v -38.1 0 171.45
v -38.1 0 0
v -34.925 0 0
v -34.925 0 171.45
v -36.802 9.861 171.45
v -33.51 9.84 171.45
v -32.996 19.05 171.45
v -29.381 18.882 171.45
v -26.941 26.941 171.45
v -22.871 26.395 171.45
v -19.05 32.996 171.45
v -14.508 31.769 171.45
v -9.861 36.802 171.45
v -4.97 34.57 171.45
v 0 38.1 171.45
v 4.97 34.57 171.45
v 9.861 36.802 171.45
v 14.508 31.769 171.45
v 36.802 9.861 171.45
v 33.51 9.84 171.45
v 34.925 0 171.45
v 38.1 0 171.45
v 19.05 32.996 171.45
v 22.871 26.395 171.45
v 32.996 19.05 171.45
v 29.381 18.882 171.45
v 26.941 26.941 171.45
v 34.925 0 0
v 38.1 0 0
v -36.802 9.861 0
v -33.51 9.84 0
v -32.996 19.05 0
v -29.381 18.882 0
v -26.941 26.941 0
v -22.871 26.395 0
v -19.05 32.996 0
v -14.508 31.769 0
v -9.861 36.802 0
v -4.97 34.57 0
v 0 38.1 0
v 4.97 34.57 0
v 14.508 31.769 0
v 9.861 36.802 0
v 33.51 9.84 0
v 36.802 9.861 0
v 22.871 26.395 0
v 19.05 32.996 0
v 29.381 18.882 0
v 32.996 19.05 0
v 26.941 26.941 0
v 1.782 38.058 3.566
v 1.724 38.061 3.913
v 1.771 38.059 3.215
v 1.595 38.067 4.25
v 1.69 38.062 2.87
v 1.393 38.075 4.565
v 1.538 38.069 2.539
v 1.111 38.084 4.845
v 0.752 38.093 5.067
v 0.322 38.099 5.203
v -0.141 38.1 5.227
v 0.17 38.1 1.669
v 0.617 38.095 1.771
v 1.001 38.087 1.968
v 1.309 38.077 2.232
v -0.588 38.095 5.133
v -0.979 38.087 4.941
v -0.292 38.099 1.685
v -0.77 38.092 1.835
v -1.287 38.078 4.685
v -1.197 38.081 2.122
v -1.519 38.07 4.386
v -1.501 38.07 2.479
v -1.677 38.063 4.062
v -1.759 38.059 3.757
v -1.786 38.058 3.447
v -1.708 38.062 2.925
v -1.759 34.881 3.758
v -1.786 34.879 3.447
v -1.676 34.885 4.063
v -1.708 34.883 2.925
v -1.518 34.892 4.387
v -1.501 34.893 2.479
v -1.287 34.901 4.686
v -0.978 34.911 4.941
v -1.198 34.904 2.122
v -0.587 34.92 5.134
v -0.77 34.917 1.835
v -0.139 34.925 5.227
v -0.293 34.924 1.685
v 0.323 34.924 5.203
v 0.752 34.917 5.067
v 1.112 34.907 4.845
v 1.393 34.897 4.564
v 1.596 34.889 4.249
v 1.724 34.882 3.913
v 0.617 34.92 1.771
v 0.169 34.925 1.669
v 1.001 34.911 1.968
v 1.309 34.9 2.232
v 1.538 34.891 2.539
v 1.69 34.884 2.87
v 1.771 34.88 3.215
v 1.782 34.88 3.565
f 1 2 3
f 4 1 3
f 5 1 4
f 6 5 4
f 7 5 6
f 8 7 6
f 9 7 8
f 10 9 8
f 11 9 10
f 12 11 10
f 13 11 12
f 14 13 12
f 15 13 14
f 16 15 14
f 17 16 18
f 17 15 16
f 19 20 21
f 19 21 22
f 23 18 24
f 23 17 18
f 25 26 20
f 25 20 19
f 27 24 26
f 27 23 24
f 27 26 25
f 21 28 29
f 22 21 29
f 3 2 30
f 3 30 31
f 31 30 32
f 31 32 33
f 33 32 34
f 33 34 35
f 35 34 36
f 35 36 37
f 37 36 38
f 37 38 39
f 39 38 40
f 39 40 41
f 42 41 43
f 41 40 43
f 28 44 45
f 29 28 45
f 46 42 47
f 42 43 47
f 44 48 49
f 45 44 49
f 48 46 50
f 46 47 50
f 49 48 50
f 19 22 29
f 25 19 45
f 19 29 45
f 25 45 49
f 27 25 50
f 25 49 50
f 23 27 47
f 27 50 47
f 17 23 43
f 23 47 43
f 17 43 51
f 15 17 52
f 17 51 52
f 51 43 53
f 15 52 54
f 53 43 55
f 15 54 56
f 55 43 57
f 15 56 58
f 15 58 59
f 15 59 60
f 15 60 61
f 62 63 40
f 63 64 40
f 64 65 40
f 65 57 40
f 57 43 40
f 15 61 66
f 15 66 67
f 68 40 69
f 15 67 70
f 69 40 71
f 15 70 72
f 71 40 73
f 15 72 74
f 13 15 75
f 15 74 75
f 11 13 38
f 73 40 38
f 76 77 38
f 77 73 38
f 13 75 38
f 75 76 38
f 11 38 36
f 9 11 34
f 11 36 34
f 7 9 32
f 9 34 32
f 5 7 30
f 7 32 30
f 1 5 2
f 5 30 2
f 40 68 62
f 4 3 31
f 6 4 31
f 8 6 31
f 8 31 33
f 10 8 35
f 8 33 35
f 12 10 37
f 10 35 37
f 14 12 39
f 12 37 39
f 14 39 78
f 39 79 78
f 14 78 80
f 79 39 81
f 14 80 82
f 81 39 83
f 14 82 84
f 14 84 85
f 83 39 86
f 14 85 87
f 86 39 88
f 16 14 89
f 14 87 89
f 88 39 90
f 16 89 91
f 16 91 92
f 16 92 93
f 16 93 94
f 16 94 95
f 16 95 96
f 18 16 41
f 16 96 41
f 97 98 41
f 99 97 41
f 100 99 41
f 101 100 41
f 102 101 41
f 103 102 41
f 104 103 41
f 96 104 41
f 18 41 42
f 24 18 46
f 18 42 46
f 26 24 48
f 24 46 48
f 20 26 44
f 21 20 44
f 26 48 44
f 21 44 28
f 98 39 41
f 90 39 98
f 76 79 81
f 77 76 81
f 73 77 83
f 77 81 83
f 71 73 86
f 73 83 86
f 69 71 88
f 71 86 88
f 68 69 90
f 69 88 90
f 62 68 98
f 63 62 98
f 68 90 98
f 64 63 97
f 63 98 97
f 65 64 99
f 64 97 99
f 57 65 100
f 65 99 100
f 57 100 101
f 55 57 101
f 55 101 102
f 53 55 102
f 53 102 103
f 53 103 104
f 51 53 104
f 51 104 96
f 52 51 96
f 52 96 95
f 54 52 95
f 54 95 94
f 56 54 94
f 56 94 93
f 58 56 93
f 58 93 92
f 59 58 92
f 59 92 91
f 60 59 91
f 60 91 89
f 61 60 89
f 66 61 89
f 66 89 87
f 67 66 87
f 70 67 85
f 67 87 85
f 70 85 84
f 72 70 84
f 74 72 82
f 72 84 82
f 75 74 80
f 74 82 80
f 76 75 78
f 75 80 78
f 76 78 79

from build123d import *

# Parameters (mm, degrees)
BOSS_EXTRUDE1_DEPTH             = 171.45
F_9_64_0_14063_DIAMETER_HOLE1_D = 3.572002


with BuildPart() as part:
    # Sketch1 → Boss-Extrude1 (new body)
    with BuildSketch(Plane.XY):
        with BuildLine():
            Line((-38.1, 0), (-34.925, 0))
            ThreePointArc((-34.925, 0), (0, 34.925), (34.925, 0))
            Line((34.925, 0), (38.1, 0))
            ThreePointArc((38.1, 0), (0, 38.1), (-38.1, 0))
        make_face()
    extrude(amount=BOSS_EXTRUDE1_DEPTH)

    # 9/64 (0.14063) Diameter Hole1 (through all)
    with Locations(Plane(origin=(0, 38.1, 0), x_dir=(1, 0, 0), z_dir=(0, 1, 0))):
        with Locations((0, -3.44678)):
            Hole(F_9_64_0_14063_DIAMETER_HOLE1_D / 2)


solid = part.part
